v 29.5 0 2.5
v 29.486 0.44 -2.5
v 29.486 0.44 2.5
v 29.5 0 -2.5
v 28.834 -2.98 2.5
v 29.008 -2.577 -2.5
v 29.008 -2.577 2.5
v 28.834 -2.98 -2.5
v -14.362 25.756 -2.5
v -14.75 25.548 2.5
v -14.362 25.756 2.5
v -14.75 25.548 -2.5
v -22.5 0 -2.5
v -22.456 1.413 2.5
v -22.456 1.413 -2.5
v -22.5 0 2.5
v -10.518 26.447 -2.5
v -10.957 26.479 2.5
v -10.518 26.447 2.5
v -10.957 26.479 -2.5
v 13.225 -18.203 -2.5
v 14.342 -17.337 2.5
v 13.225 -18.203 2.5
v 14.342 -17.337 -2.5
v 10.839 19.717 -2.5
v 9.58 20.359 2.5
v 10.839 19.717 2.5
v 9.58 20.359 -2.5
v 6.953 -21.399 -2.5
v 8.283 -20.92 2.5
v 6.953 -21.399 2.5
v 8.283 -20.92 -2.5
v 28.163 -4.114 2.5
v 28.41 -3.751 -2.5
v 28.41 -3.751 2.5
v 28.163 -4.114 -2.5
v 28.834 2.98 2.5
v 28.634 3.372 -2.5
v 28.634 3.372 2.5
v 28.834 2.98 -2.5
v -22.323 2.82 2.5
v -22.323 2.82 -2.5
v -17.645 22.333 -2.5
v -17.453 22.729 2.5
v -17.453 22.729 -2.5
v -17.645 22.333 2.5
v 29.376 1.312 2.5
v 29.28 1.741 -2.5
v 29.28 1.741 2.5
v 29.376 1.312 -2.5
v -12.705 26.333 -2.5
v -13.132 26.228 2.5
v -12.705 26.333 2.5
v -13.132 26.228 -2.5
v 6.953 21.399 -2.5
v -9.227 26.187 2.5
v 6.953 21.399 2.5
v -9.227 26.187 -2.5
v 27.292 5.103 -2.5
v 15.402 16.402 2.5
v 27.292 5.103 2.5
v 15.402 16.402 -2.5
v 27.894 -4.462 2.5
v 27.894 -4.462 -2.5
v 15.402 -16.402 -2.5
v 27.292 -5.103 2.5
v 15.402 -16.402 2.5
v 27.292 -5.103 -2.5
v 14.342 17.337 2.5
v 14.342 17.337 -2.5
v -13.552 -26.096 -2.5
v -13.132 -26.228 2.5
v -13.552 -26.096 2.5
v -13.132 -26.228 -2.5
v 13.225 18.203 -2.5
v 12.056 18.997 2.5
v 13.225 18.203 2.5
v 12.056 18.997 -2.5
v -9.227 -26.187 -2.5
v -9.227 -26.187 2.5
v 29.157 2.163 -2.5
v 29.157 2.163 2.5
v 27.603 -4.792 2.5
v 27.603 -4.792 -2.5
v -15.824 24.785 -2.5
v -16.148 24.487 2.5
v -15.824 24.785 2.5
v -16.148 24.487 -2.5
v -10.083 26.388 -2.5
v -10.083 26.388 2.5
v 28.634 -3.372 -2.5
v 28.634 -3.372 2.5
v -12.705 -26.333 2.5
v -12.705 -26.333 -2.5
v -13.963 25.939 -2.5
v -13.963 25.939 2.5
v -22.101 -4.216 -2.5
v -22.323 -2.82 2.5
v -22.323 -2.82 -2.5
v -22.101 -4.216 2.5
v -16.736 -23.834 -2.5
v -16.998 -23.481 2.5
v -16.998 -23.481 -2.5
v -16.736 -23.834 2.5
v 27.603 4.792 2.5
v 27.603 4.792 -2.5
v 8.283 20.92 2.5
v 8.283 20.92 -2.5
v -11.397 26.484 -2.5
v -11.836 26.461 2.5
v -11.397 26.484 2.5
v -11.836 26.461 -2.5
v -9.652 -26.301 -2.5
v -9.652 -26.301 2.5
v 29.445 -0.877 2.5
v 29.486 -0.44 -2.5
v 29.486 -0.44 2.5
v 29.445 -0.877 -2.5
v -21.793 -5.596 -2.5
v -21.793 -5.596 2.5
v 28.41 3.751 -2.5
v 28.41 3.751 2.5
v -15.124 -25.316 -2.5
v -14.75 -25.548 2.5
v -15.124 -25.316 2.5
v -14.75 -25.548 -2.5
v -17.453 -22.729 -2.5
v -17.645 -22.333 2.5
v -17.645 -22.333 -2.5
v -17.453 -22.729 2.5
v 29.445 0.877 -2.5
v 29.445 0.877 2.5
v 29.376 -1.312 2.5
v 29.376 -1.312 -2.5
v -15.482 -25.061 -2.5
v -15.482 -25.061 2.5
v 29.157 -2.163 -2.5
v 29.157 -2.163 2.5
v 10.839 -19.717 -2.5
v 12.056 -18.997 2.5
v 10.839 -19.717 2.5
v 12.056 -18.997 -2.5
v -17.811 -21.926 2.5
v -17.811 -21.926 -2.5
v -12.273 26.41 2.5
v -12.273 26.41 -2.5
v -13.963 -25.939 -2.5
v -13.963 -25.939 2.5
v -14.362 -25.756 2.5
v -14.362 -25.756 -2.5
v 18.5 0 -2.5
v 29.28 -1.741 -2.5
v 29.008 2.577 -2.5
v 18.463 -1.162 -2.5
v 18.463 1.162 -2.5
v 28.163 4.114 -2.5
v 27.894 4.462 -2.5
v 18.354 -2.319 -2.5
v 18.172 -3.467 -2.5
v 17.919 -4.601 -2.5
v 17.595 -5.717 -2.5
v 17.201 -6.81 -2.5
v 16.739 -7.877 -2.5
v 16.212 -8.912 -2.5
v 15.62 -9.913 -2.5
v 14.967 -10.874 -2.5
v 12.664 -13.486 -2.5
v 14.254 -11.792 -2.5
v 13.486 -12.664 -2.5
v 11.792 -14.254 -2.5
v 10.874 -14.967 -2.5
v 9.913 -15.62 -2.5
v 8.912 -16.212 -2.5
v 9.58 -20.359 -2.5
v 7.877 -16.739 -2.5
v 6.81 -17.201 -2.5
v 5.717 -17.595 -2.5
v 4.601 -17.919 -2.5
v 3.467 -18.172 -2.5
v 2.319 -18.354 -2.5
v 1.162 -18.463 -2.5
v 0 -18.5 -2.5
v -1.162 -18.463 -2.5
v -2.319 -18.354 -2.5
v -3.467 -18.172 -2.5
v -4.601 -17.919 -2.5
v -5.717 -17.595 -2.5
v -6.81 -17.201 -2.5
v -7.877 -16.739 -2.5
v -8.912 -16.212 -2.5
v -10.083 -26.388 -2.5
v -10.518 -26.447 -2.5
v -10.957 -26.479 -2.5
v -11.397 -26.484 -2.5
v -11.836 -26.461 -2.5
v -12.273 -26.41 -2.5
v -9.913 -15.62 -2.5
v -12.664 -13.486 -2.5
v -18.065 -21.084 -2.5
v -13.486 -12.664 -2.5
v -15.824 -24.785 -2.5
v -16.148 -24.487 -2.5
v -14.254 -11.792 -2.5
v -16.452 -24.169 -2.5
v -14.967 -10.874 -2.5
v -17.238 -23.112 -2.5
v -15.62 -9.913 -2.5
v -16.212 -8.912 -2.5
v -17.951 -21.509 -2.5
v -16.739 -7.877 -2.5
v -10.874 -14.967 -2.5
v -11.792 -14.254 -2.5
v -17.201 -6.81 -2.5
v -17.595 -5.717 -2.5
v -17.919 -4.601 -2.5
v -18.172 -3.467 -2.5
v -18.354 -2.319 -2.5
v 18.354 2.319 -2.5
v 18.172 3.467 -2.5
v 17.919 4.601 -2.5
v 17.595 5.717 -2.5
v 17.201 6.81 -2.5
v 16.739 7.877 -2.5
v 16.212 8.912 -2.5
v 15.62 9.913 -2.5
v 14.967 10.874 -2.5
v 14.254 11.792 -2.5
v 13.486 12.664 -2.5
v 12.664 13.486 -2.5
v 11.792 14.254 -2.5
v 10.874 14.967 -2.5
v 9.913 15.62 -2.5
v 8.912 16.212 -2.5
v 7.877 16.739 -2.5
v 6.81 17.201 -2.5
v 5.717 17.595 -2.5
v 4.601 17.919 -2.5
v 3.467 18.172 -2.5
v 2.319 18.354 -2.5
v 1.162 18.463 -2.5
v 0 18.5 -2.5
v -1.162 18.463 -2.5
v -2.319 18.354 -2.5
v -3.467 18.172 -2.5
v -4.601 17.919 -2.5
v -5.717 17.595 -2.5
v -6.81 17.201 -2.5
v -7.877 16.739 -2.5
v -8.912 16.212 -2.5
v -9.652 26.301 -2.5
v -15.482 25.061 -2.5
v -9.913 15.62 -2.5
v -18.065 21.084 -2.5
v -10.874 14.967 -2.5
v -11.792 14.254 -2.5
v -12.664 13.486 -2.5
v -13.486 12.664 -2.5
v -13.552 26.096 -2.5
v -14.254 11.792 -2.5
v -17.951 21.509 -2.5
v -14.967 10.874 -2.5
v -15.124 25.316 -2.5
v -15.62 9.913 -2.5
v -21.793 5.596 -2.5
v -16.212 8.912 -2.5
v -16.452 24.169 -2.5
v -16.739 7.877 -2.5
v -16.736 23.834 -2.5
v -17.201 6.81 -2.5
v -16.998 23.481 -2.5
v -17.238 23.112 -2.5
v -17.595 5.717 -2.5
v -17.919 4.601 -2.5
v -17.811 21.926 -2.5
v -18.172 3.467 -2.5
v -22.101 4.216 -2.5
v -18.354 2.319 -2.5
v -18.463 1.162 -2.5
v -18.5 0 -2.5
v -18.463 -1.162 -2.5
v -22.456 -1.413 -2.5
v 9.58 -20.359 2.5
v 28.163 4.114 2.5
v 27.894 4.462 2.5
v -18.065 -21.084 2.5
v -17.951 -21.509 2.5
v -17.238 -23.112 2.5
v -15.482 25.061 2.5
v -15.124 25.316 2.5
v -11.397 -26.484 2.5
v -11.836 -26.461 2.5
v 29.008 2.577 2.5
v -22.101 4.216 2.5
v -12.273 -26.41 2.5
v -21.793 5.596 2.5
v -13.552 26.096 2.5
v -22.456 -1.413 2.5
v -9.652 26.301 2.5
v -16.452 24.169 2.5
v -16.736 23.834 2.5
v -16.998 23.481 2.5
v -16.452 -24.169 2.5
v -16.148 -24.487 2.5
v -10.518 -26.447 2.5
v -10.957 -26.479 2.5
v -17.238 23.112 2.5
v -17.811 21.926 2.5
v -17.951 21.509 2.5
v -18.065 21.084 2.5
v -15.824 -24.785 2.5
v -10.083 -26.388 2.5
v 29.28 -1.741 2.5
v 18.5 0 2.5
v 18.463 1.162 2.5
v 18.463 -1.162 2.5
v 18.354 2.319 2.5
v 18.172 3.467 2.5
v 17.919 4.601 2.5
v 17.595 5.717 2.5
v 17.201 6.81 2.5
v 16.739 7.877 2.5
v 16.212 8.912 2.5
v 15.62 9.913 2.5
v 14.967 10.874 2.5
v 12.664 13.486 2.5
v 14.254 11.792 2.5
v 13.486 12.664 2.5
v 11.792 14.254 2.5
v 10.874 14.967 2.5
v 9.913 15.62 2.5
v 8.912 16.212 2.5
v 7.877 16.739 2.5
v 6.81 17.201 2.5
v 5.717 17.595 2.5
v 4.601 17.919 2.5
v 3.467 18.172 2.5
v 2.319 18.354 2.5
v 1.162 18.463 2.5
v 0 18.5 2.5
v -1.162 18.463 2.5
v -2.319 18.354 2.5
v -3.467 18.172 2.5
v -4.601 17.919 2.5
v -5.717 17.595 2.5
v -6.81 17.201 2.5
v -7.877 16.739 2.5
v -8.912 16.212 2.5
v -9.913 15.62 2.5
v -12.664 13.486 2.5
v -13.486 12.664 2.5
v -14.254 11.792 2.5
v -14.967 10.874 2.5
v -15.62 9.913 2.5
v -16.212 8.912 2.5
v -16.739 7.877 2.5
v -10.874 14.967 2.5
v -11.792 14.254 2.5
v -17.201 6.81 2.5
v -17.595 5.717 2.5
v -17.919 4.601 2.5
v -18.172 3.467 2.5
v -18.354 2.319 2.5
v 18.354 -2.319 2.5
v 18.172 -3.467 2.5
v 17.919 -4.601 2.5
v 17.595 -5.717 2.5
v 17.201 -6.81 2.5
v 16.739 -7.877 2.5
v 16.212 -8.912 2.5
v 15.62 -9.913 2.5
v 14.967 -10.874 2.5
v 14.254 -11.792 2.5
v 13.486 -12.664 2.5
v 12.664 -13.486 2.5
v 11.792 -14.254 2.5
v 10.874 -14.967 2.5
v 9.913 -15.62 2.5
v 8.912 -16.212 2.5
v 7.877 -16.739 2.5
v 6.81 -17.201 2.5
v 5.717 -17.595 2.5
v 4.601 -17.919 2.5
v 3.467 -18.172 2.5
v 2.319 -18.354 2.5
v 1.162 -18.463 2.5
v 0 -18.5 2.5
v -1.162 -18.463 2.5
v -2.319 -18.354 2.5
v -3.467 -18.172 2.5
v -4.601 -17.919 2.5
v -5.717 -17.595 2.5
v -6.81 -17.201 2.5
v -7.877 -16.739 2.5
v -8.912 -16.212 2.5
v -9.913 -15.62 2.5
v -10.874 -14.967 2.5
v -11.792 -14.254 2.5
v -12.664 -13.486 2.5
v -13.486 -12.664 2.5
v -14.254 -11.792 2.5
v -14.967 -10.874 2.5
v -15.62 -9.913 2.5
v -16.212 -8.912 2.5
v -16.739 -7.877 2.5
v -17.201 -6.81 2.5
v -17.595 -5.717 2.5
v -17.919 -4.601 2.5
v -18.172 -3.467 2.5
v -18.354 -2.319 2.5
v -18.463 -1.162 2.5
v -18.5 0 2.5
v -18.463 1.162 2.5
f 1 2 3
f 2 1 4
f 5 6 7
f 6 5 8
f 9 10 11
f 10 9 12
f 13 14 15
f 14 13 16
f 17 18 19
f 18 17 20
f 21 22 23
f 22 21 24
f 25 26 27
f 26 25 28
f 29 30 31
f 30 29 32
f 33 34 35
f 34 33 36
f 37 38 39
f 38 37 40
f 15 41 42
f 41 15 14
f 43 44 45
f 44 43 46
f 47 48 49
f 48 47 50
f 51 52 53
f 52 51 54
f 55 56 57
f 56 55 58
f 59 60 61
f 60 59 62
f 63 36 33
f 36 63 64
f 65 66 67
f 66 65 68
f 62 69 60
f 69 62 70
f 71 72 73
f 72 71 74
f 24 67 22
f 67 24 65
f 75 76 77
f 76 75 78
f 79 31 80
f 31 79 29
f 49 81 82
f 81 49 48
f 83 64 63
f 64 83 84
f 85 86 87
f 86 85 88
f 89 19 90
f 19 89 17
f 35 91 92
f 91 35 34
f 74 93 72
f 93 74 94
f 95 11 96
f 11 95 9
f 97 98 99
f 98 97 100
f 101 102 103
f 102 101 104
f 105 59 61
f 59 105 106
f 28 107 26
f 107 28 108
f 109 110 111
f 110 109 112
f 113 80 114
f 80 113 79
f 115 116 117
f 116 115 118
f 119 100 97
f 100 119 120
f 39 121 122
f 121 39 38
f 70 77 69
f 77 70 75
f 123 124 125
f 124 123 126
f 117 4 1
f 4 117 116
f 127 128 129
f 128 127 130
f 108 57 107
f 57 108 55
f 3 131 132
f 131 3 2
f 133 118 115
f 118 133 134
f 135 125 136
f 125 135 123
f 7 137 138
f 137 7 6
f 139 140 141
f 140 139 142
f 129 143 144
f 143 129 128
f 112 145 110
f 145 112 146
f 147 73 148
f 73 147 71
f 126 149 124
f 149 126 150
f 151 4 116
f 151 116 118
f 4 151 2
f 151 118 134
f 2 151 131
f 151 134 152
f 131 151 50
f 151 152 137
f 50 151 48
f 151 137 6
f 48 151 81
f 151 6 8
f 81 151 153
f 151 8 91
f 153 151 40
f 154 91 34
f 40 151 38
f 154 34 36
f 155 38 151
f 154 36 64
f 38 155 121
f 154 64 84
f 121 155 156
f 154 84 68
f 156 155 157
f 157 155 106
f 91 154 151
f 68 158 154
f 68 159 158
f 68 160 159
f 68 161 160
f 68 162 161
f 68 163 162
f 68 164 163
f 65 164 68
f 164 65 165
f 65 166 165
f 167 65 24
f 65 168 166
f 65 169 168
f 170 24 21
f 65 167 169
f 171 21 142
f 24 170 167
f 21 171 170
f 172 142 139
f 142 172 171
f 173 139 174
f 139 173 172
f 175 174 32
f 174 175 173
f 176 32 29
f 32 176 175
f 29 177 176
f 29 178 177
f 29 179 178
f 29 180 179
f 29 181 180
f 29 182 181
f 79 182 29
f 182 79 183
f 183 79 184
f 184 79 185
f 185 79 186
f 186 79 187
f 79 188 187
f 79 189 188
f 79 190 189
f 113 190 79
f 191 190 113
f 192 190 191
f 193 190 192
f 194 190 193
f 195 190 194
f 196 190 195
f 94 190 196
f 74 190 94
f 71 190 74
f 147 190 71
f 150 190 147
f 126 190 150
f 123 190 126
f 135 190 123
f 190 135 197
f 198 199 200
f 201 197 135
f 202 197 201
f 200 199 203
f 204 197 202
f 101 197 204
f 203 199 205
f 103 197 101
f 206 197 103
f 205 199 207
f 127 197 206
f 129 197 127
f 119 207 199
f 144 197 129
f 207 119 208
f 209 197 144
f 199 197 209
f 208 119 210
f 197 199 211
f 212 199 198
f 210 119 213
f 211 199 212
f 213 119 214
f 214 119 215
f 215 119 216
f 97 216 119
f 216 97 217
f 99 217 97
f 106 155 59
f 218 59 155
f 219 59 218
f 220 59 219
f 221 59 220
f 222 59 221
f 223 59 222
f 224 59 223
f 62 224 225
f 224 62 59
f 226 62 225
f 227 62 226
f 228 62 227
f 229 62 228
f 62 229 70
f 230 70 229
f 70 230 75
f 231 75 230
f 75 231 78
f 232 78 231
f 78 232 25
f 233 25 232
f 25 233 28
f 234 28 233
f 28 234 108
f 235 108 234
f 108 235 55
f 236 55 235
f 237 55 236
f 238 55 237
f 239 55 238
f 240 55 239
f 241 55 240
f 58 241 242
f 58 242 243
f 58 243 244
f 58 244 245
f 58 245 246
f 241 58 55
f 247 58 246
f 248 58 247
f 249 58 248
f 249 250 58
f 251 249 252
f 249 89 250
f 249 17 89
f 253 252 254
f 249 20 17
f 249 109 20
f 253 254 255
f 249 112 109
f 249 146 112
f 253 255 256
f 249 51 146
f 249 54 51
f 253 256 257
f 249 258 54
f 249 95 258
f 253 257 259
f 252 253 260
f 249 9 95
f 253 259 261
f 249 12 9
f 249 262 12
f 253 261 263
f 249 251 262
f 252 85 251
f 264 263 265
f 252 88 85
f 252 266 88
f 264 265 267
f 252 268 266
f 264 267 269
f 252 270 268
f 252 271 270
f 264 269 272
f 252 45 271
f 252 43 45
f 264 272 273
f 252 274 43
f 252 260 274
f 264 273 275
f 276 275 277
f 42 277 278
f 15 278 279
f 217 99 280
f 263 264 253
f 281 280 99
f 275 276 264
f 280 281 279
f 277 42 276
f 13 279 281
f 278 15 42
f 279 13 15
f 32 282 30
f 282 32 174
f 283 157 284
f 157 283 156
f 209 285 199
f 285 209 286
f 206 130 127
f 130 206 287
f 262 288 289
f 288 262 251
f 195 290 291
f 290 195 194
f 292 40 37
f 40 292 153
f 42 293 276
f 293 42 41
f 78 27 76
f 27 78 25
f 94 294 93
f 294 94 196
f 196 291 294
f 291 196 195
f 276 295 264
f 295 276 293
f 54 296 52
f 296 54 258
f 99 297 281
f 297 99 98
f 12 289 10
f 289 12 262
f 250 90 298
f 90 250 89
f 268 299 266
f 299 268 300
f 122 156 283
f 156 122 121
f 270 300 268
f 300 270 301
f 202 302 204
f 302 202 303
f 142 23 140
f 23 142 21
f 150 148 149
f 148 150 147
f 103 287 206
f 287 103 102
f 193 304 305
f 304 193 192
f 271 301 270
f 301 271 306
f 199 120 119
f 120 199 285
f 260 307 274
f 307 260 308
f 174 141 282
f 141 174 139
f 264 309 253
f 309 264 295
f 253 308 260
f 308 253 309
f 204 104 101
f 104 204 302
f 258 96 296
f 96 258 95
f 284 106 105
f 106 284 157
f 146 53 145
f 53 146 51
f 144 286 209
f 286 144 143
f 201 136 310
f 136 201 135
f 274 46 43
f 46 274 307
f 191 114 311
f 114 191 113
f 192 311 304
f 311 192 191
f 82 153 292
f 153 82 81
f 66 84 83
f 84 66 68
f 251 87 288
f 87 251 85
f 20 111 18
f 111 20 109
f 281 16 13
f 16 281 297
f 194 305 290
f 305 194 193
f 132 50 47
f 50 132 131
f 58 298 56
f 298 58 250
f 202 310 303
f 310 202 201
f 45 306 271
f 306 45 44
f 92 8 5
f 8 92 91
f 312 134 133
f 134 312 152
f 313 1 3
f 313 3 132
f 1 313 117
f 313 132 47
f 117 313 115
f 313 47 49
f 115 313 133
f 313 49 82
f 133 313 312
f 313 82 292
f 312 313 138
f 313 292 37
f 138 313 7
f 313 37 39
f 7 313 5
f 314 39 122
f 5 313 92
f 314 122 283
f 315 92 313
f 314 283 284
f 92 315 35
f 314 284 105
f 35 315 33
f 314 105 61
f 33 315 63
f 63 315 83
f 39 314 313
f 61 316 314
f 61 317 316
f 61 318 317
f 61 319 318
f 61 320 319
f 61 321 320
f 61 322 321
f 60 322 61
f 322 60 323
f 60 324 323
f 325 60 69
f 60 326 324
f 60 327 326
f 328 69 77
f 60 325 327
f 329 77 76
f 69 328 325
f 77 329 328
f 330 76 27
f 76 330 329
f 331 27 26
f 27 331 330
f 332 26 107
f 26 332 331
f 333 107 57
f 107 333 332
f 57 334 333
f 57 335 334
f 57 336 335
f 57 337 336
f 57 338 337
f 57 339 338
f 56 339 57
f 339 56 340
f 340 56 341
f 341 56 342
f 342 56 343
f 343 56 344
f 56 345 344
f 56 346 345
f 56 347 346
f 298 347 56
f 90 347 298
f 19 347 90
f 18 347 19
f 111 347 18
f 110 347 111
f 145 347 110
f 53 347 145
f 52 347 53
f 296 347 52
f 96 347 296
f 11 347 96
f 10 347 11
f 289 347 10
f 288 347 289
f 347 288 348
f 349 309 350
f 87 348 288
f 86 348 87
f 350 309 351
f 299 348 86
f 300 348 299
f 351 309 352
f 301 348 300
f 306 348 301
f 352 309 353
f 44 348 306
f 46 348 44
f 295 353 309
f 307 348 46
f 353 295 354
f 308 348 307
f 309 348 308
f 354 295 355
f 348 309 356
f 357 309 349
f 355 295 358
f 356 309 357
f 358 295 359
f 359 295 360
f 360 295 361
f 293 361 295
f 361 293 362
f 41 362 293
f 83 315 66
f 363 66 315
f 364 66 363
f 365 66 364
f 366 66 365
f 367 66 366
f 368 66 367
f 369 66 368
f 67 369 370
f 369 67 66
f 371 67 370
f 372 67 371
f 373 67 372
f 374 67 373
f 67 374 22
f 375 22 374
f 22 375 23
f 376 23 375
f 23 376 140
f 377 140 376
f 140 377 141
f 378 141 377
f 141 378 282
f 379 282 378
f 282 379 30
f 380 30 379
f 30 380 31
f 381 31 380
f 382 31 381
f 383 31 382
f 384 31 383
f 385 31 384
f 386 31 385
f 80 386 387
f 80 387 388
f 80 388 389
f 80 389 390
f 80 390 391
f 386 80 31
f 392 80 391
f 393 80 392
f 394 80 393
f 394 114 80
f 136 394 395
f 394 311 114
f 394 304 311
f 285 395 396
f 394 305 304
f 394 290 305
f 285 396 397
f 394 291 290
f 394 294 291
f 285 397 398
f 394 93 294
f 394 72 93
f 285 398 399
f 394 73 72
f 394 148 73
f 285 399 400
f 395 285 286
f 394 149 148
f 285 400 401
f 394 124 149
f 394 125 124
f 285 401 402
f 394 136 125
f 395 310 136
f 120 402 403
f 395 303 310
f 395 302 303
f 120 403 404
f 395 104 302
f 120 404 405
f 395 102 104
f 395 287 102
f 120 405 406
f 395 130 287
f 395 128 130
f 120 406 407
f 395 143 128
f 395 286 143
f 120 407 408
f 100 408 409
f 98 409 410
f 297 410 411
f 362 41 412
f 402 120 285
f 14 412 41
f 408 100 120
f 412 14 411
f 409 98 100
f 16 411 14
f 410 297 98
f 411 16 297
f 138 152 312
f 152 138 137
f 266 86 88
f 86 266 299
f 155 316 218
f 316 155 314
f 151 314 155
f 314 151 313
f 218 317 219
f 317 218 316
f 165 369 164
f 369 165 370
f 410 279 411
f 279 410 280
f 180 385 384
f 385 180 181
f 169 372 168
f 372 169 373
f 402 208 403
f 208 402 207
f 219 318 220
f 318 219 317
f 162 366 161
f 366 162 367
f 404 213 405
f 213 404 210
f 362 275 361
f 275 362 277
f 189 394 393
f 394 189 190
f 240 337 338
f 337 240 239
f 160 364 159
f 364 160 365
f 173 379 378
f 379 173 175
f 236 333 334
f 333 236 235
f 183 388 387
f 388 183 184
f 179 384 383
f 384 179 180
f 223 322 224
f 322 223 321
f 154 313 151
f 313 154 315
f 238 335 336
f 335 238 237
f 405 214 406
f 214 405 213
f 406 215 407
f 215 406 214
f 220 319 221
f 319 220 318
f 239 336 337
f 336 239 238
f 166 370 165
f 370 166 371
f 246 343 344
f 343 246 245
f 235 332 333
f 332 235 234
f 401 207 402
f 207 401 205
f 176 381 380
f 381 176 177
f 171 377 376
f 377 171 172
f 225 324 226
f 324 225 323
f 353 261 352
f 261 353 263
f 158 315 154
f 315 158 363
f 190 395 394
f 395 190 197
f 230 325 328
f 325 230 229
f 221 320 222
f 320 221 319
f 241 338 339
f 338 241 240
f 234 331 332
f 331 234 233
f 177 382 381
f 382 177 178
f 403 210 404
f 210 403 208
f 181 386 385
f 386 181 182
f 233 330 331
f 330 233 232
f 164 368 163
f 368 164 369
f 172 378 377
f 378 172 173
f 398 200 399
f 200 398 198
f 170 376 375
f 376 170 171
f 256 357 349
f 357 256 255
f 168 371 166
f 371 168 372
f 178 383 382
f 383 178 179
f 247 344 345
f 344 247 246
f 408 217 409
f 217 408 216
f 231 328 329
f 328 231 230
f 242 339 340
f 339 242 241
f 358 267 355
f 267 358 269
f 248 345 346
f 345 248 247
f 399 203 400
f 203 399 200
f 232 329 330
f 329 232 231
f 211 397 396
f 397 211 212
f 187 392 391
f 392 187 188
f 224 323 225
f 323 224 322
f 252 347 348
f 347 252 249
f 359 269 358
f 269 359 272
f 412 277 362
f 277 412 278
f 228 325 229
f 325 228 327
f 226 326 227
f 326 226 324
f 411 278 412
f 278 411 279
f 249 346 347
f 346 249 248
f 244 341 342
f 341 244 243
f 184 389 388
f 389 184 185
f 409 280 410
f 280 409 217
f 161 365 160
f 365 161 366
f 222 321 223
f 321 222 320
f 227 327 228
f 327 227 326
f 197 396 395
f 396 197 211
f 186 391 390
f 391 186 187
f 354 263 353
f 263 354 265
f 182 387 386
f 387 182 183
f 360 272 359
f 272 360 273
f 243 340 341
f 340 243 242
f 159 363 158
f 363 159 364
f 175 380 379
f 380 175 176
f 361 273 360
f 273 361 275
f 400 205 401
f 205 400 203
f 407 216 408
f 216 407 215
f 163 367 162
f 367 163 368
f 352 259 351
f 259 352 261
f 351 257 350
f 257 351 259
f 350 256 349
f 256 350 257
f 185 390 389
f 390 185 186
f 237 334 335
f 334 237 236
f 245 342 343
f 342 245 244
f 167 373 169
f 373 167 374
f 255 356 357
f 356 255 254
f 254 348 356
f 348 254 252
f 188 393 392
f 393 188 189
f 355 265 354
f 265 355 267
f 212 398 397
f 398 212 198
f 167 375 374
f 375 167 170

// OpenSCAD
//height
a=5;
//internal radius of holder
b=37/2;
//radius of grabbers
c=7;
//thickness
t=4;

difference(){
hull(){
cylinder(h=a, r=b+t, center=true, $fn=100);
translate([b+t,0,0])cylinder(h=a, r=c, center=true, $fn=100);
rotate([0,0,120])translate([b+t,0,0])cylinder(h=a, r=c, center=true, $fn=100);
rotate([0,0,240])translate([b+t,0,0])cylinder(h=a, r=c, center=true, $fn=100);
}
cylinder(h=a+1, r=b, center=true, $fn=100);
}
